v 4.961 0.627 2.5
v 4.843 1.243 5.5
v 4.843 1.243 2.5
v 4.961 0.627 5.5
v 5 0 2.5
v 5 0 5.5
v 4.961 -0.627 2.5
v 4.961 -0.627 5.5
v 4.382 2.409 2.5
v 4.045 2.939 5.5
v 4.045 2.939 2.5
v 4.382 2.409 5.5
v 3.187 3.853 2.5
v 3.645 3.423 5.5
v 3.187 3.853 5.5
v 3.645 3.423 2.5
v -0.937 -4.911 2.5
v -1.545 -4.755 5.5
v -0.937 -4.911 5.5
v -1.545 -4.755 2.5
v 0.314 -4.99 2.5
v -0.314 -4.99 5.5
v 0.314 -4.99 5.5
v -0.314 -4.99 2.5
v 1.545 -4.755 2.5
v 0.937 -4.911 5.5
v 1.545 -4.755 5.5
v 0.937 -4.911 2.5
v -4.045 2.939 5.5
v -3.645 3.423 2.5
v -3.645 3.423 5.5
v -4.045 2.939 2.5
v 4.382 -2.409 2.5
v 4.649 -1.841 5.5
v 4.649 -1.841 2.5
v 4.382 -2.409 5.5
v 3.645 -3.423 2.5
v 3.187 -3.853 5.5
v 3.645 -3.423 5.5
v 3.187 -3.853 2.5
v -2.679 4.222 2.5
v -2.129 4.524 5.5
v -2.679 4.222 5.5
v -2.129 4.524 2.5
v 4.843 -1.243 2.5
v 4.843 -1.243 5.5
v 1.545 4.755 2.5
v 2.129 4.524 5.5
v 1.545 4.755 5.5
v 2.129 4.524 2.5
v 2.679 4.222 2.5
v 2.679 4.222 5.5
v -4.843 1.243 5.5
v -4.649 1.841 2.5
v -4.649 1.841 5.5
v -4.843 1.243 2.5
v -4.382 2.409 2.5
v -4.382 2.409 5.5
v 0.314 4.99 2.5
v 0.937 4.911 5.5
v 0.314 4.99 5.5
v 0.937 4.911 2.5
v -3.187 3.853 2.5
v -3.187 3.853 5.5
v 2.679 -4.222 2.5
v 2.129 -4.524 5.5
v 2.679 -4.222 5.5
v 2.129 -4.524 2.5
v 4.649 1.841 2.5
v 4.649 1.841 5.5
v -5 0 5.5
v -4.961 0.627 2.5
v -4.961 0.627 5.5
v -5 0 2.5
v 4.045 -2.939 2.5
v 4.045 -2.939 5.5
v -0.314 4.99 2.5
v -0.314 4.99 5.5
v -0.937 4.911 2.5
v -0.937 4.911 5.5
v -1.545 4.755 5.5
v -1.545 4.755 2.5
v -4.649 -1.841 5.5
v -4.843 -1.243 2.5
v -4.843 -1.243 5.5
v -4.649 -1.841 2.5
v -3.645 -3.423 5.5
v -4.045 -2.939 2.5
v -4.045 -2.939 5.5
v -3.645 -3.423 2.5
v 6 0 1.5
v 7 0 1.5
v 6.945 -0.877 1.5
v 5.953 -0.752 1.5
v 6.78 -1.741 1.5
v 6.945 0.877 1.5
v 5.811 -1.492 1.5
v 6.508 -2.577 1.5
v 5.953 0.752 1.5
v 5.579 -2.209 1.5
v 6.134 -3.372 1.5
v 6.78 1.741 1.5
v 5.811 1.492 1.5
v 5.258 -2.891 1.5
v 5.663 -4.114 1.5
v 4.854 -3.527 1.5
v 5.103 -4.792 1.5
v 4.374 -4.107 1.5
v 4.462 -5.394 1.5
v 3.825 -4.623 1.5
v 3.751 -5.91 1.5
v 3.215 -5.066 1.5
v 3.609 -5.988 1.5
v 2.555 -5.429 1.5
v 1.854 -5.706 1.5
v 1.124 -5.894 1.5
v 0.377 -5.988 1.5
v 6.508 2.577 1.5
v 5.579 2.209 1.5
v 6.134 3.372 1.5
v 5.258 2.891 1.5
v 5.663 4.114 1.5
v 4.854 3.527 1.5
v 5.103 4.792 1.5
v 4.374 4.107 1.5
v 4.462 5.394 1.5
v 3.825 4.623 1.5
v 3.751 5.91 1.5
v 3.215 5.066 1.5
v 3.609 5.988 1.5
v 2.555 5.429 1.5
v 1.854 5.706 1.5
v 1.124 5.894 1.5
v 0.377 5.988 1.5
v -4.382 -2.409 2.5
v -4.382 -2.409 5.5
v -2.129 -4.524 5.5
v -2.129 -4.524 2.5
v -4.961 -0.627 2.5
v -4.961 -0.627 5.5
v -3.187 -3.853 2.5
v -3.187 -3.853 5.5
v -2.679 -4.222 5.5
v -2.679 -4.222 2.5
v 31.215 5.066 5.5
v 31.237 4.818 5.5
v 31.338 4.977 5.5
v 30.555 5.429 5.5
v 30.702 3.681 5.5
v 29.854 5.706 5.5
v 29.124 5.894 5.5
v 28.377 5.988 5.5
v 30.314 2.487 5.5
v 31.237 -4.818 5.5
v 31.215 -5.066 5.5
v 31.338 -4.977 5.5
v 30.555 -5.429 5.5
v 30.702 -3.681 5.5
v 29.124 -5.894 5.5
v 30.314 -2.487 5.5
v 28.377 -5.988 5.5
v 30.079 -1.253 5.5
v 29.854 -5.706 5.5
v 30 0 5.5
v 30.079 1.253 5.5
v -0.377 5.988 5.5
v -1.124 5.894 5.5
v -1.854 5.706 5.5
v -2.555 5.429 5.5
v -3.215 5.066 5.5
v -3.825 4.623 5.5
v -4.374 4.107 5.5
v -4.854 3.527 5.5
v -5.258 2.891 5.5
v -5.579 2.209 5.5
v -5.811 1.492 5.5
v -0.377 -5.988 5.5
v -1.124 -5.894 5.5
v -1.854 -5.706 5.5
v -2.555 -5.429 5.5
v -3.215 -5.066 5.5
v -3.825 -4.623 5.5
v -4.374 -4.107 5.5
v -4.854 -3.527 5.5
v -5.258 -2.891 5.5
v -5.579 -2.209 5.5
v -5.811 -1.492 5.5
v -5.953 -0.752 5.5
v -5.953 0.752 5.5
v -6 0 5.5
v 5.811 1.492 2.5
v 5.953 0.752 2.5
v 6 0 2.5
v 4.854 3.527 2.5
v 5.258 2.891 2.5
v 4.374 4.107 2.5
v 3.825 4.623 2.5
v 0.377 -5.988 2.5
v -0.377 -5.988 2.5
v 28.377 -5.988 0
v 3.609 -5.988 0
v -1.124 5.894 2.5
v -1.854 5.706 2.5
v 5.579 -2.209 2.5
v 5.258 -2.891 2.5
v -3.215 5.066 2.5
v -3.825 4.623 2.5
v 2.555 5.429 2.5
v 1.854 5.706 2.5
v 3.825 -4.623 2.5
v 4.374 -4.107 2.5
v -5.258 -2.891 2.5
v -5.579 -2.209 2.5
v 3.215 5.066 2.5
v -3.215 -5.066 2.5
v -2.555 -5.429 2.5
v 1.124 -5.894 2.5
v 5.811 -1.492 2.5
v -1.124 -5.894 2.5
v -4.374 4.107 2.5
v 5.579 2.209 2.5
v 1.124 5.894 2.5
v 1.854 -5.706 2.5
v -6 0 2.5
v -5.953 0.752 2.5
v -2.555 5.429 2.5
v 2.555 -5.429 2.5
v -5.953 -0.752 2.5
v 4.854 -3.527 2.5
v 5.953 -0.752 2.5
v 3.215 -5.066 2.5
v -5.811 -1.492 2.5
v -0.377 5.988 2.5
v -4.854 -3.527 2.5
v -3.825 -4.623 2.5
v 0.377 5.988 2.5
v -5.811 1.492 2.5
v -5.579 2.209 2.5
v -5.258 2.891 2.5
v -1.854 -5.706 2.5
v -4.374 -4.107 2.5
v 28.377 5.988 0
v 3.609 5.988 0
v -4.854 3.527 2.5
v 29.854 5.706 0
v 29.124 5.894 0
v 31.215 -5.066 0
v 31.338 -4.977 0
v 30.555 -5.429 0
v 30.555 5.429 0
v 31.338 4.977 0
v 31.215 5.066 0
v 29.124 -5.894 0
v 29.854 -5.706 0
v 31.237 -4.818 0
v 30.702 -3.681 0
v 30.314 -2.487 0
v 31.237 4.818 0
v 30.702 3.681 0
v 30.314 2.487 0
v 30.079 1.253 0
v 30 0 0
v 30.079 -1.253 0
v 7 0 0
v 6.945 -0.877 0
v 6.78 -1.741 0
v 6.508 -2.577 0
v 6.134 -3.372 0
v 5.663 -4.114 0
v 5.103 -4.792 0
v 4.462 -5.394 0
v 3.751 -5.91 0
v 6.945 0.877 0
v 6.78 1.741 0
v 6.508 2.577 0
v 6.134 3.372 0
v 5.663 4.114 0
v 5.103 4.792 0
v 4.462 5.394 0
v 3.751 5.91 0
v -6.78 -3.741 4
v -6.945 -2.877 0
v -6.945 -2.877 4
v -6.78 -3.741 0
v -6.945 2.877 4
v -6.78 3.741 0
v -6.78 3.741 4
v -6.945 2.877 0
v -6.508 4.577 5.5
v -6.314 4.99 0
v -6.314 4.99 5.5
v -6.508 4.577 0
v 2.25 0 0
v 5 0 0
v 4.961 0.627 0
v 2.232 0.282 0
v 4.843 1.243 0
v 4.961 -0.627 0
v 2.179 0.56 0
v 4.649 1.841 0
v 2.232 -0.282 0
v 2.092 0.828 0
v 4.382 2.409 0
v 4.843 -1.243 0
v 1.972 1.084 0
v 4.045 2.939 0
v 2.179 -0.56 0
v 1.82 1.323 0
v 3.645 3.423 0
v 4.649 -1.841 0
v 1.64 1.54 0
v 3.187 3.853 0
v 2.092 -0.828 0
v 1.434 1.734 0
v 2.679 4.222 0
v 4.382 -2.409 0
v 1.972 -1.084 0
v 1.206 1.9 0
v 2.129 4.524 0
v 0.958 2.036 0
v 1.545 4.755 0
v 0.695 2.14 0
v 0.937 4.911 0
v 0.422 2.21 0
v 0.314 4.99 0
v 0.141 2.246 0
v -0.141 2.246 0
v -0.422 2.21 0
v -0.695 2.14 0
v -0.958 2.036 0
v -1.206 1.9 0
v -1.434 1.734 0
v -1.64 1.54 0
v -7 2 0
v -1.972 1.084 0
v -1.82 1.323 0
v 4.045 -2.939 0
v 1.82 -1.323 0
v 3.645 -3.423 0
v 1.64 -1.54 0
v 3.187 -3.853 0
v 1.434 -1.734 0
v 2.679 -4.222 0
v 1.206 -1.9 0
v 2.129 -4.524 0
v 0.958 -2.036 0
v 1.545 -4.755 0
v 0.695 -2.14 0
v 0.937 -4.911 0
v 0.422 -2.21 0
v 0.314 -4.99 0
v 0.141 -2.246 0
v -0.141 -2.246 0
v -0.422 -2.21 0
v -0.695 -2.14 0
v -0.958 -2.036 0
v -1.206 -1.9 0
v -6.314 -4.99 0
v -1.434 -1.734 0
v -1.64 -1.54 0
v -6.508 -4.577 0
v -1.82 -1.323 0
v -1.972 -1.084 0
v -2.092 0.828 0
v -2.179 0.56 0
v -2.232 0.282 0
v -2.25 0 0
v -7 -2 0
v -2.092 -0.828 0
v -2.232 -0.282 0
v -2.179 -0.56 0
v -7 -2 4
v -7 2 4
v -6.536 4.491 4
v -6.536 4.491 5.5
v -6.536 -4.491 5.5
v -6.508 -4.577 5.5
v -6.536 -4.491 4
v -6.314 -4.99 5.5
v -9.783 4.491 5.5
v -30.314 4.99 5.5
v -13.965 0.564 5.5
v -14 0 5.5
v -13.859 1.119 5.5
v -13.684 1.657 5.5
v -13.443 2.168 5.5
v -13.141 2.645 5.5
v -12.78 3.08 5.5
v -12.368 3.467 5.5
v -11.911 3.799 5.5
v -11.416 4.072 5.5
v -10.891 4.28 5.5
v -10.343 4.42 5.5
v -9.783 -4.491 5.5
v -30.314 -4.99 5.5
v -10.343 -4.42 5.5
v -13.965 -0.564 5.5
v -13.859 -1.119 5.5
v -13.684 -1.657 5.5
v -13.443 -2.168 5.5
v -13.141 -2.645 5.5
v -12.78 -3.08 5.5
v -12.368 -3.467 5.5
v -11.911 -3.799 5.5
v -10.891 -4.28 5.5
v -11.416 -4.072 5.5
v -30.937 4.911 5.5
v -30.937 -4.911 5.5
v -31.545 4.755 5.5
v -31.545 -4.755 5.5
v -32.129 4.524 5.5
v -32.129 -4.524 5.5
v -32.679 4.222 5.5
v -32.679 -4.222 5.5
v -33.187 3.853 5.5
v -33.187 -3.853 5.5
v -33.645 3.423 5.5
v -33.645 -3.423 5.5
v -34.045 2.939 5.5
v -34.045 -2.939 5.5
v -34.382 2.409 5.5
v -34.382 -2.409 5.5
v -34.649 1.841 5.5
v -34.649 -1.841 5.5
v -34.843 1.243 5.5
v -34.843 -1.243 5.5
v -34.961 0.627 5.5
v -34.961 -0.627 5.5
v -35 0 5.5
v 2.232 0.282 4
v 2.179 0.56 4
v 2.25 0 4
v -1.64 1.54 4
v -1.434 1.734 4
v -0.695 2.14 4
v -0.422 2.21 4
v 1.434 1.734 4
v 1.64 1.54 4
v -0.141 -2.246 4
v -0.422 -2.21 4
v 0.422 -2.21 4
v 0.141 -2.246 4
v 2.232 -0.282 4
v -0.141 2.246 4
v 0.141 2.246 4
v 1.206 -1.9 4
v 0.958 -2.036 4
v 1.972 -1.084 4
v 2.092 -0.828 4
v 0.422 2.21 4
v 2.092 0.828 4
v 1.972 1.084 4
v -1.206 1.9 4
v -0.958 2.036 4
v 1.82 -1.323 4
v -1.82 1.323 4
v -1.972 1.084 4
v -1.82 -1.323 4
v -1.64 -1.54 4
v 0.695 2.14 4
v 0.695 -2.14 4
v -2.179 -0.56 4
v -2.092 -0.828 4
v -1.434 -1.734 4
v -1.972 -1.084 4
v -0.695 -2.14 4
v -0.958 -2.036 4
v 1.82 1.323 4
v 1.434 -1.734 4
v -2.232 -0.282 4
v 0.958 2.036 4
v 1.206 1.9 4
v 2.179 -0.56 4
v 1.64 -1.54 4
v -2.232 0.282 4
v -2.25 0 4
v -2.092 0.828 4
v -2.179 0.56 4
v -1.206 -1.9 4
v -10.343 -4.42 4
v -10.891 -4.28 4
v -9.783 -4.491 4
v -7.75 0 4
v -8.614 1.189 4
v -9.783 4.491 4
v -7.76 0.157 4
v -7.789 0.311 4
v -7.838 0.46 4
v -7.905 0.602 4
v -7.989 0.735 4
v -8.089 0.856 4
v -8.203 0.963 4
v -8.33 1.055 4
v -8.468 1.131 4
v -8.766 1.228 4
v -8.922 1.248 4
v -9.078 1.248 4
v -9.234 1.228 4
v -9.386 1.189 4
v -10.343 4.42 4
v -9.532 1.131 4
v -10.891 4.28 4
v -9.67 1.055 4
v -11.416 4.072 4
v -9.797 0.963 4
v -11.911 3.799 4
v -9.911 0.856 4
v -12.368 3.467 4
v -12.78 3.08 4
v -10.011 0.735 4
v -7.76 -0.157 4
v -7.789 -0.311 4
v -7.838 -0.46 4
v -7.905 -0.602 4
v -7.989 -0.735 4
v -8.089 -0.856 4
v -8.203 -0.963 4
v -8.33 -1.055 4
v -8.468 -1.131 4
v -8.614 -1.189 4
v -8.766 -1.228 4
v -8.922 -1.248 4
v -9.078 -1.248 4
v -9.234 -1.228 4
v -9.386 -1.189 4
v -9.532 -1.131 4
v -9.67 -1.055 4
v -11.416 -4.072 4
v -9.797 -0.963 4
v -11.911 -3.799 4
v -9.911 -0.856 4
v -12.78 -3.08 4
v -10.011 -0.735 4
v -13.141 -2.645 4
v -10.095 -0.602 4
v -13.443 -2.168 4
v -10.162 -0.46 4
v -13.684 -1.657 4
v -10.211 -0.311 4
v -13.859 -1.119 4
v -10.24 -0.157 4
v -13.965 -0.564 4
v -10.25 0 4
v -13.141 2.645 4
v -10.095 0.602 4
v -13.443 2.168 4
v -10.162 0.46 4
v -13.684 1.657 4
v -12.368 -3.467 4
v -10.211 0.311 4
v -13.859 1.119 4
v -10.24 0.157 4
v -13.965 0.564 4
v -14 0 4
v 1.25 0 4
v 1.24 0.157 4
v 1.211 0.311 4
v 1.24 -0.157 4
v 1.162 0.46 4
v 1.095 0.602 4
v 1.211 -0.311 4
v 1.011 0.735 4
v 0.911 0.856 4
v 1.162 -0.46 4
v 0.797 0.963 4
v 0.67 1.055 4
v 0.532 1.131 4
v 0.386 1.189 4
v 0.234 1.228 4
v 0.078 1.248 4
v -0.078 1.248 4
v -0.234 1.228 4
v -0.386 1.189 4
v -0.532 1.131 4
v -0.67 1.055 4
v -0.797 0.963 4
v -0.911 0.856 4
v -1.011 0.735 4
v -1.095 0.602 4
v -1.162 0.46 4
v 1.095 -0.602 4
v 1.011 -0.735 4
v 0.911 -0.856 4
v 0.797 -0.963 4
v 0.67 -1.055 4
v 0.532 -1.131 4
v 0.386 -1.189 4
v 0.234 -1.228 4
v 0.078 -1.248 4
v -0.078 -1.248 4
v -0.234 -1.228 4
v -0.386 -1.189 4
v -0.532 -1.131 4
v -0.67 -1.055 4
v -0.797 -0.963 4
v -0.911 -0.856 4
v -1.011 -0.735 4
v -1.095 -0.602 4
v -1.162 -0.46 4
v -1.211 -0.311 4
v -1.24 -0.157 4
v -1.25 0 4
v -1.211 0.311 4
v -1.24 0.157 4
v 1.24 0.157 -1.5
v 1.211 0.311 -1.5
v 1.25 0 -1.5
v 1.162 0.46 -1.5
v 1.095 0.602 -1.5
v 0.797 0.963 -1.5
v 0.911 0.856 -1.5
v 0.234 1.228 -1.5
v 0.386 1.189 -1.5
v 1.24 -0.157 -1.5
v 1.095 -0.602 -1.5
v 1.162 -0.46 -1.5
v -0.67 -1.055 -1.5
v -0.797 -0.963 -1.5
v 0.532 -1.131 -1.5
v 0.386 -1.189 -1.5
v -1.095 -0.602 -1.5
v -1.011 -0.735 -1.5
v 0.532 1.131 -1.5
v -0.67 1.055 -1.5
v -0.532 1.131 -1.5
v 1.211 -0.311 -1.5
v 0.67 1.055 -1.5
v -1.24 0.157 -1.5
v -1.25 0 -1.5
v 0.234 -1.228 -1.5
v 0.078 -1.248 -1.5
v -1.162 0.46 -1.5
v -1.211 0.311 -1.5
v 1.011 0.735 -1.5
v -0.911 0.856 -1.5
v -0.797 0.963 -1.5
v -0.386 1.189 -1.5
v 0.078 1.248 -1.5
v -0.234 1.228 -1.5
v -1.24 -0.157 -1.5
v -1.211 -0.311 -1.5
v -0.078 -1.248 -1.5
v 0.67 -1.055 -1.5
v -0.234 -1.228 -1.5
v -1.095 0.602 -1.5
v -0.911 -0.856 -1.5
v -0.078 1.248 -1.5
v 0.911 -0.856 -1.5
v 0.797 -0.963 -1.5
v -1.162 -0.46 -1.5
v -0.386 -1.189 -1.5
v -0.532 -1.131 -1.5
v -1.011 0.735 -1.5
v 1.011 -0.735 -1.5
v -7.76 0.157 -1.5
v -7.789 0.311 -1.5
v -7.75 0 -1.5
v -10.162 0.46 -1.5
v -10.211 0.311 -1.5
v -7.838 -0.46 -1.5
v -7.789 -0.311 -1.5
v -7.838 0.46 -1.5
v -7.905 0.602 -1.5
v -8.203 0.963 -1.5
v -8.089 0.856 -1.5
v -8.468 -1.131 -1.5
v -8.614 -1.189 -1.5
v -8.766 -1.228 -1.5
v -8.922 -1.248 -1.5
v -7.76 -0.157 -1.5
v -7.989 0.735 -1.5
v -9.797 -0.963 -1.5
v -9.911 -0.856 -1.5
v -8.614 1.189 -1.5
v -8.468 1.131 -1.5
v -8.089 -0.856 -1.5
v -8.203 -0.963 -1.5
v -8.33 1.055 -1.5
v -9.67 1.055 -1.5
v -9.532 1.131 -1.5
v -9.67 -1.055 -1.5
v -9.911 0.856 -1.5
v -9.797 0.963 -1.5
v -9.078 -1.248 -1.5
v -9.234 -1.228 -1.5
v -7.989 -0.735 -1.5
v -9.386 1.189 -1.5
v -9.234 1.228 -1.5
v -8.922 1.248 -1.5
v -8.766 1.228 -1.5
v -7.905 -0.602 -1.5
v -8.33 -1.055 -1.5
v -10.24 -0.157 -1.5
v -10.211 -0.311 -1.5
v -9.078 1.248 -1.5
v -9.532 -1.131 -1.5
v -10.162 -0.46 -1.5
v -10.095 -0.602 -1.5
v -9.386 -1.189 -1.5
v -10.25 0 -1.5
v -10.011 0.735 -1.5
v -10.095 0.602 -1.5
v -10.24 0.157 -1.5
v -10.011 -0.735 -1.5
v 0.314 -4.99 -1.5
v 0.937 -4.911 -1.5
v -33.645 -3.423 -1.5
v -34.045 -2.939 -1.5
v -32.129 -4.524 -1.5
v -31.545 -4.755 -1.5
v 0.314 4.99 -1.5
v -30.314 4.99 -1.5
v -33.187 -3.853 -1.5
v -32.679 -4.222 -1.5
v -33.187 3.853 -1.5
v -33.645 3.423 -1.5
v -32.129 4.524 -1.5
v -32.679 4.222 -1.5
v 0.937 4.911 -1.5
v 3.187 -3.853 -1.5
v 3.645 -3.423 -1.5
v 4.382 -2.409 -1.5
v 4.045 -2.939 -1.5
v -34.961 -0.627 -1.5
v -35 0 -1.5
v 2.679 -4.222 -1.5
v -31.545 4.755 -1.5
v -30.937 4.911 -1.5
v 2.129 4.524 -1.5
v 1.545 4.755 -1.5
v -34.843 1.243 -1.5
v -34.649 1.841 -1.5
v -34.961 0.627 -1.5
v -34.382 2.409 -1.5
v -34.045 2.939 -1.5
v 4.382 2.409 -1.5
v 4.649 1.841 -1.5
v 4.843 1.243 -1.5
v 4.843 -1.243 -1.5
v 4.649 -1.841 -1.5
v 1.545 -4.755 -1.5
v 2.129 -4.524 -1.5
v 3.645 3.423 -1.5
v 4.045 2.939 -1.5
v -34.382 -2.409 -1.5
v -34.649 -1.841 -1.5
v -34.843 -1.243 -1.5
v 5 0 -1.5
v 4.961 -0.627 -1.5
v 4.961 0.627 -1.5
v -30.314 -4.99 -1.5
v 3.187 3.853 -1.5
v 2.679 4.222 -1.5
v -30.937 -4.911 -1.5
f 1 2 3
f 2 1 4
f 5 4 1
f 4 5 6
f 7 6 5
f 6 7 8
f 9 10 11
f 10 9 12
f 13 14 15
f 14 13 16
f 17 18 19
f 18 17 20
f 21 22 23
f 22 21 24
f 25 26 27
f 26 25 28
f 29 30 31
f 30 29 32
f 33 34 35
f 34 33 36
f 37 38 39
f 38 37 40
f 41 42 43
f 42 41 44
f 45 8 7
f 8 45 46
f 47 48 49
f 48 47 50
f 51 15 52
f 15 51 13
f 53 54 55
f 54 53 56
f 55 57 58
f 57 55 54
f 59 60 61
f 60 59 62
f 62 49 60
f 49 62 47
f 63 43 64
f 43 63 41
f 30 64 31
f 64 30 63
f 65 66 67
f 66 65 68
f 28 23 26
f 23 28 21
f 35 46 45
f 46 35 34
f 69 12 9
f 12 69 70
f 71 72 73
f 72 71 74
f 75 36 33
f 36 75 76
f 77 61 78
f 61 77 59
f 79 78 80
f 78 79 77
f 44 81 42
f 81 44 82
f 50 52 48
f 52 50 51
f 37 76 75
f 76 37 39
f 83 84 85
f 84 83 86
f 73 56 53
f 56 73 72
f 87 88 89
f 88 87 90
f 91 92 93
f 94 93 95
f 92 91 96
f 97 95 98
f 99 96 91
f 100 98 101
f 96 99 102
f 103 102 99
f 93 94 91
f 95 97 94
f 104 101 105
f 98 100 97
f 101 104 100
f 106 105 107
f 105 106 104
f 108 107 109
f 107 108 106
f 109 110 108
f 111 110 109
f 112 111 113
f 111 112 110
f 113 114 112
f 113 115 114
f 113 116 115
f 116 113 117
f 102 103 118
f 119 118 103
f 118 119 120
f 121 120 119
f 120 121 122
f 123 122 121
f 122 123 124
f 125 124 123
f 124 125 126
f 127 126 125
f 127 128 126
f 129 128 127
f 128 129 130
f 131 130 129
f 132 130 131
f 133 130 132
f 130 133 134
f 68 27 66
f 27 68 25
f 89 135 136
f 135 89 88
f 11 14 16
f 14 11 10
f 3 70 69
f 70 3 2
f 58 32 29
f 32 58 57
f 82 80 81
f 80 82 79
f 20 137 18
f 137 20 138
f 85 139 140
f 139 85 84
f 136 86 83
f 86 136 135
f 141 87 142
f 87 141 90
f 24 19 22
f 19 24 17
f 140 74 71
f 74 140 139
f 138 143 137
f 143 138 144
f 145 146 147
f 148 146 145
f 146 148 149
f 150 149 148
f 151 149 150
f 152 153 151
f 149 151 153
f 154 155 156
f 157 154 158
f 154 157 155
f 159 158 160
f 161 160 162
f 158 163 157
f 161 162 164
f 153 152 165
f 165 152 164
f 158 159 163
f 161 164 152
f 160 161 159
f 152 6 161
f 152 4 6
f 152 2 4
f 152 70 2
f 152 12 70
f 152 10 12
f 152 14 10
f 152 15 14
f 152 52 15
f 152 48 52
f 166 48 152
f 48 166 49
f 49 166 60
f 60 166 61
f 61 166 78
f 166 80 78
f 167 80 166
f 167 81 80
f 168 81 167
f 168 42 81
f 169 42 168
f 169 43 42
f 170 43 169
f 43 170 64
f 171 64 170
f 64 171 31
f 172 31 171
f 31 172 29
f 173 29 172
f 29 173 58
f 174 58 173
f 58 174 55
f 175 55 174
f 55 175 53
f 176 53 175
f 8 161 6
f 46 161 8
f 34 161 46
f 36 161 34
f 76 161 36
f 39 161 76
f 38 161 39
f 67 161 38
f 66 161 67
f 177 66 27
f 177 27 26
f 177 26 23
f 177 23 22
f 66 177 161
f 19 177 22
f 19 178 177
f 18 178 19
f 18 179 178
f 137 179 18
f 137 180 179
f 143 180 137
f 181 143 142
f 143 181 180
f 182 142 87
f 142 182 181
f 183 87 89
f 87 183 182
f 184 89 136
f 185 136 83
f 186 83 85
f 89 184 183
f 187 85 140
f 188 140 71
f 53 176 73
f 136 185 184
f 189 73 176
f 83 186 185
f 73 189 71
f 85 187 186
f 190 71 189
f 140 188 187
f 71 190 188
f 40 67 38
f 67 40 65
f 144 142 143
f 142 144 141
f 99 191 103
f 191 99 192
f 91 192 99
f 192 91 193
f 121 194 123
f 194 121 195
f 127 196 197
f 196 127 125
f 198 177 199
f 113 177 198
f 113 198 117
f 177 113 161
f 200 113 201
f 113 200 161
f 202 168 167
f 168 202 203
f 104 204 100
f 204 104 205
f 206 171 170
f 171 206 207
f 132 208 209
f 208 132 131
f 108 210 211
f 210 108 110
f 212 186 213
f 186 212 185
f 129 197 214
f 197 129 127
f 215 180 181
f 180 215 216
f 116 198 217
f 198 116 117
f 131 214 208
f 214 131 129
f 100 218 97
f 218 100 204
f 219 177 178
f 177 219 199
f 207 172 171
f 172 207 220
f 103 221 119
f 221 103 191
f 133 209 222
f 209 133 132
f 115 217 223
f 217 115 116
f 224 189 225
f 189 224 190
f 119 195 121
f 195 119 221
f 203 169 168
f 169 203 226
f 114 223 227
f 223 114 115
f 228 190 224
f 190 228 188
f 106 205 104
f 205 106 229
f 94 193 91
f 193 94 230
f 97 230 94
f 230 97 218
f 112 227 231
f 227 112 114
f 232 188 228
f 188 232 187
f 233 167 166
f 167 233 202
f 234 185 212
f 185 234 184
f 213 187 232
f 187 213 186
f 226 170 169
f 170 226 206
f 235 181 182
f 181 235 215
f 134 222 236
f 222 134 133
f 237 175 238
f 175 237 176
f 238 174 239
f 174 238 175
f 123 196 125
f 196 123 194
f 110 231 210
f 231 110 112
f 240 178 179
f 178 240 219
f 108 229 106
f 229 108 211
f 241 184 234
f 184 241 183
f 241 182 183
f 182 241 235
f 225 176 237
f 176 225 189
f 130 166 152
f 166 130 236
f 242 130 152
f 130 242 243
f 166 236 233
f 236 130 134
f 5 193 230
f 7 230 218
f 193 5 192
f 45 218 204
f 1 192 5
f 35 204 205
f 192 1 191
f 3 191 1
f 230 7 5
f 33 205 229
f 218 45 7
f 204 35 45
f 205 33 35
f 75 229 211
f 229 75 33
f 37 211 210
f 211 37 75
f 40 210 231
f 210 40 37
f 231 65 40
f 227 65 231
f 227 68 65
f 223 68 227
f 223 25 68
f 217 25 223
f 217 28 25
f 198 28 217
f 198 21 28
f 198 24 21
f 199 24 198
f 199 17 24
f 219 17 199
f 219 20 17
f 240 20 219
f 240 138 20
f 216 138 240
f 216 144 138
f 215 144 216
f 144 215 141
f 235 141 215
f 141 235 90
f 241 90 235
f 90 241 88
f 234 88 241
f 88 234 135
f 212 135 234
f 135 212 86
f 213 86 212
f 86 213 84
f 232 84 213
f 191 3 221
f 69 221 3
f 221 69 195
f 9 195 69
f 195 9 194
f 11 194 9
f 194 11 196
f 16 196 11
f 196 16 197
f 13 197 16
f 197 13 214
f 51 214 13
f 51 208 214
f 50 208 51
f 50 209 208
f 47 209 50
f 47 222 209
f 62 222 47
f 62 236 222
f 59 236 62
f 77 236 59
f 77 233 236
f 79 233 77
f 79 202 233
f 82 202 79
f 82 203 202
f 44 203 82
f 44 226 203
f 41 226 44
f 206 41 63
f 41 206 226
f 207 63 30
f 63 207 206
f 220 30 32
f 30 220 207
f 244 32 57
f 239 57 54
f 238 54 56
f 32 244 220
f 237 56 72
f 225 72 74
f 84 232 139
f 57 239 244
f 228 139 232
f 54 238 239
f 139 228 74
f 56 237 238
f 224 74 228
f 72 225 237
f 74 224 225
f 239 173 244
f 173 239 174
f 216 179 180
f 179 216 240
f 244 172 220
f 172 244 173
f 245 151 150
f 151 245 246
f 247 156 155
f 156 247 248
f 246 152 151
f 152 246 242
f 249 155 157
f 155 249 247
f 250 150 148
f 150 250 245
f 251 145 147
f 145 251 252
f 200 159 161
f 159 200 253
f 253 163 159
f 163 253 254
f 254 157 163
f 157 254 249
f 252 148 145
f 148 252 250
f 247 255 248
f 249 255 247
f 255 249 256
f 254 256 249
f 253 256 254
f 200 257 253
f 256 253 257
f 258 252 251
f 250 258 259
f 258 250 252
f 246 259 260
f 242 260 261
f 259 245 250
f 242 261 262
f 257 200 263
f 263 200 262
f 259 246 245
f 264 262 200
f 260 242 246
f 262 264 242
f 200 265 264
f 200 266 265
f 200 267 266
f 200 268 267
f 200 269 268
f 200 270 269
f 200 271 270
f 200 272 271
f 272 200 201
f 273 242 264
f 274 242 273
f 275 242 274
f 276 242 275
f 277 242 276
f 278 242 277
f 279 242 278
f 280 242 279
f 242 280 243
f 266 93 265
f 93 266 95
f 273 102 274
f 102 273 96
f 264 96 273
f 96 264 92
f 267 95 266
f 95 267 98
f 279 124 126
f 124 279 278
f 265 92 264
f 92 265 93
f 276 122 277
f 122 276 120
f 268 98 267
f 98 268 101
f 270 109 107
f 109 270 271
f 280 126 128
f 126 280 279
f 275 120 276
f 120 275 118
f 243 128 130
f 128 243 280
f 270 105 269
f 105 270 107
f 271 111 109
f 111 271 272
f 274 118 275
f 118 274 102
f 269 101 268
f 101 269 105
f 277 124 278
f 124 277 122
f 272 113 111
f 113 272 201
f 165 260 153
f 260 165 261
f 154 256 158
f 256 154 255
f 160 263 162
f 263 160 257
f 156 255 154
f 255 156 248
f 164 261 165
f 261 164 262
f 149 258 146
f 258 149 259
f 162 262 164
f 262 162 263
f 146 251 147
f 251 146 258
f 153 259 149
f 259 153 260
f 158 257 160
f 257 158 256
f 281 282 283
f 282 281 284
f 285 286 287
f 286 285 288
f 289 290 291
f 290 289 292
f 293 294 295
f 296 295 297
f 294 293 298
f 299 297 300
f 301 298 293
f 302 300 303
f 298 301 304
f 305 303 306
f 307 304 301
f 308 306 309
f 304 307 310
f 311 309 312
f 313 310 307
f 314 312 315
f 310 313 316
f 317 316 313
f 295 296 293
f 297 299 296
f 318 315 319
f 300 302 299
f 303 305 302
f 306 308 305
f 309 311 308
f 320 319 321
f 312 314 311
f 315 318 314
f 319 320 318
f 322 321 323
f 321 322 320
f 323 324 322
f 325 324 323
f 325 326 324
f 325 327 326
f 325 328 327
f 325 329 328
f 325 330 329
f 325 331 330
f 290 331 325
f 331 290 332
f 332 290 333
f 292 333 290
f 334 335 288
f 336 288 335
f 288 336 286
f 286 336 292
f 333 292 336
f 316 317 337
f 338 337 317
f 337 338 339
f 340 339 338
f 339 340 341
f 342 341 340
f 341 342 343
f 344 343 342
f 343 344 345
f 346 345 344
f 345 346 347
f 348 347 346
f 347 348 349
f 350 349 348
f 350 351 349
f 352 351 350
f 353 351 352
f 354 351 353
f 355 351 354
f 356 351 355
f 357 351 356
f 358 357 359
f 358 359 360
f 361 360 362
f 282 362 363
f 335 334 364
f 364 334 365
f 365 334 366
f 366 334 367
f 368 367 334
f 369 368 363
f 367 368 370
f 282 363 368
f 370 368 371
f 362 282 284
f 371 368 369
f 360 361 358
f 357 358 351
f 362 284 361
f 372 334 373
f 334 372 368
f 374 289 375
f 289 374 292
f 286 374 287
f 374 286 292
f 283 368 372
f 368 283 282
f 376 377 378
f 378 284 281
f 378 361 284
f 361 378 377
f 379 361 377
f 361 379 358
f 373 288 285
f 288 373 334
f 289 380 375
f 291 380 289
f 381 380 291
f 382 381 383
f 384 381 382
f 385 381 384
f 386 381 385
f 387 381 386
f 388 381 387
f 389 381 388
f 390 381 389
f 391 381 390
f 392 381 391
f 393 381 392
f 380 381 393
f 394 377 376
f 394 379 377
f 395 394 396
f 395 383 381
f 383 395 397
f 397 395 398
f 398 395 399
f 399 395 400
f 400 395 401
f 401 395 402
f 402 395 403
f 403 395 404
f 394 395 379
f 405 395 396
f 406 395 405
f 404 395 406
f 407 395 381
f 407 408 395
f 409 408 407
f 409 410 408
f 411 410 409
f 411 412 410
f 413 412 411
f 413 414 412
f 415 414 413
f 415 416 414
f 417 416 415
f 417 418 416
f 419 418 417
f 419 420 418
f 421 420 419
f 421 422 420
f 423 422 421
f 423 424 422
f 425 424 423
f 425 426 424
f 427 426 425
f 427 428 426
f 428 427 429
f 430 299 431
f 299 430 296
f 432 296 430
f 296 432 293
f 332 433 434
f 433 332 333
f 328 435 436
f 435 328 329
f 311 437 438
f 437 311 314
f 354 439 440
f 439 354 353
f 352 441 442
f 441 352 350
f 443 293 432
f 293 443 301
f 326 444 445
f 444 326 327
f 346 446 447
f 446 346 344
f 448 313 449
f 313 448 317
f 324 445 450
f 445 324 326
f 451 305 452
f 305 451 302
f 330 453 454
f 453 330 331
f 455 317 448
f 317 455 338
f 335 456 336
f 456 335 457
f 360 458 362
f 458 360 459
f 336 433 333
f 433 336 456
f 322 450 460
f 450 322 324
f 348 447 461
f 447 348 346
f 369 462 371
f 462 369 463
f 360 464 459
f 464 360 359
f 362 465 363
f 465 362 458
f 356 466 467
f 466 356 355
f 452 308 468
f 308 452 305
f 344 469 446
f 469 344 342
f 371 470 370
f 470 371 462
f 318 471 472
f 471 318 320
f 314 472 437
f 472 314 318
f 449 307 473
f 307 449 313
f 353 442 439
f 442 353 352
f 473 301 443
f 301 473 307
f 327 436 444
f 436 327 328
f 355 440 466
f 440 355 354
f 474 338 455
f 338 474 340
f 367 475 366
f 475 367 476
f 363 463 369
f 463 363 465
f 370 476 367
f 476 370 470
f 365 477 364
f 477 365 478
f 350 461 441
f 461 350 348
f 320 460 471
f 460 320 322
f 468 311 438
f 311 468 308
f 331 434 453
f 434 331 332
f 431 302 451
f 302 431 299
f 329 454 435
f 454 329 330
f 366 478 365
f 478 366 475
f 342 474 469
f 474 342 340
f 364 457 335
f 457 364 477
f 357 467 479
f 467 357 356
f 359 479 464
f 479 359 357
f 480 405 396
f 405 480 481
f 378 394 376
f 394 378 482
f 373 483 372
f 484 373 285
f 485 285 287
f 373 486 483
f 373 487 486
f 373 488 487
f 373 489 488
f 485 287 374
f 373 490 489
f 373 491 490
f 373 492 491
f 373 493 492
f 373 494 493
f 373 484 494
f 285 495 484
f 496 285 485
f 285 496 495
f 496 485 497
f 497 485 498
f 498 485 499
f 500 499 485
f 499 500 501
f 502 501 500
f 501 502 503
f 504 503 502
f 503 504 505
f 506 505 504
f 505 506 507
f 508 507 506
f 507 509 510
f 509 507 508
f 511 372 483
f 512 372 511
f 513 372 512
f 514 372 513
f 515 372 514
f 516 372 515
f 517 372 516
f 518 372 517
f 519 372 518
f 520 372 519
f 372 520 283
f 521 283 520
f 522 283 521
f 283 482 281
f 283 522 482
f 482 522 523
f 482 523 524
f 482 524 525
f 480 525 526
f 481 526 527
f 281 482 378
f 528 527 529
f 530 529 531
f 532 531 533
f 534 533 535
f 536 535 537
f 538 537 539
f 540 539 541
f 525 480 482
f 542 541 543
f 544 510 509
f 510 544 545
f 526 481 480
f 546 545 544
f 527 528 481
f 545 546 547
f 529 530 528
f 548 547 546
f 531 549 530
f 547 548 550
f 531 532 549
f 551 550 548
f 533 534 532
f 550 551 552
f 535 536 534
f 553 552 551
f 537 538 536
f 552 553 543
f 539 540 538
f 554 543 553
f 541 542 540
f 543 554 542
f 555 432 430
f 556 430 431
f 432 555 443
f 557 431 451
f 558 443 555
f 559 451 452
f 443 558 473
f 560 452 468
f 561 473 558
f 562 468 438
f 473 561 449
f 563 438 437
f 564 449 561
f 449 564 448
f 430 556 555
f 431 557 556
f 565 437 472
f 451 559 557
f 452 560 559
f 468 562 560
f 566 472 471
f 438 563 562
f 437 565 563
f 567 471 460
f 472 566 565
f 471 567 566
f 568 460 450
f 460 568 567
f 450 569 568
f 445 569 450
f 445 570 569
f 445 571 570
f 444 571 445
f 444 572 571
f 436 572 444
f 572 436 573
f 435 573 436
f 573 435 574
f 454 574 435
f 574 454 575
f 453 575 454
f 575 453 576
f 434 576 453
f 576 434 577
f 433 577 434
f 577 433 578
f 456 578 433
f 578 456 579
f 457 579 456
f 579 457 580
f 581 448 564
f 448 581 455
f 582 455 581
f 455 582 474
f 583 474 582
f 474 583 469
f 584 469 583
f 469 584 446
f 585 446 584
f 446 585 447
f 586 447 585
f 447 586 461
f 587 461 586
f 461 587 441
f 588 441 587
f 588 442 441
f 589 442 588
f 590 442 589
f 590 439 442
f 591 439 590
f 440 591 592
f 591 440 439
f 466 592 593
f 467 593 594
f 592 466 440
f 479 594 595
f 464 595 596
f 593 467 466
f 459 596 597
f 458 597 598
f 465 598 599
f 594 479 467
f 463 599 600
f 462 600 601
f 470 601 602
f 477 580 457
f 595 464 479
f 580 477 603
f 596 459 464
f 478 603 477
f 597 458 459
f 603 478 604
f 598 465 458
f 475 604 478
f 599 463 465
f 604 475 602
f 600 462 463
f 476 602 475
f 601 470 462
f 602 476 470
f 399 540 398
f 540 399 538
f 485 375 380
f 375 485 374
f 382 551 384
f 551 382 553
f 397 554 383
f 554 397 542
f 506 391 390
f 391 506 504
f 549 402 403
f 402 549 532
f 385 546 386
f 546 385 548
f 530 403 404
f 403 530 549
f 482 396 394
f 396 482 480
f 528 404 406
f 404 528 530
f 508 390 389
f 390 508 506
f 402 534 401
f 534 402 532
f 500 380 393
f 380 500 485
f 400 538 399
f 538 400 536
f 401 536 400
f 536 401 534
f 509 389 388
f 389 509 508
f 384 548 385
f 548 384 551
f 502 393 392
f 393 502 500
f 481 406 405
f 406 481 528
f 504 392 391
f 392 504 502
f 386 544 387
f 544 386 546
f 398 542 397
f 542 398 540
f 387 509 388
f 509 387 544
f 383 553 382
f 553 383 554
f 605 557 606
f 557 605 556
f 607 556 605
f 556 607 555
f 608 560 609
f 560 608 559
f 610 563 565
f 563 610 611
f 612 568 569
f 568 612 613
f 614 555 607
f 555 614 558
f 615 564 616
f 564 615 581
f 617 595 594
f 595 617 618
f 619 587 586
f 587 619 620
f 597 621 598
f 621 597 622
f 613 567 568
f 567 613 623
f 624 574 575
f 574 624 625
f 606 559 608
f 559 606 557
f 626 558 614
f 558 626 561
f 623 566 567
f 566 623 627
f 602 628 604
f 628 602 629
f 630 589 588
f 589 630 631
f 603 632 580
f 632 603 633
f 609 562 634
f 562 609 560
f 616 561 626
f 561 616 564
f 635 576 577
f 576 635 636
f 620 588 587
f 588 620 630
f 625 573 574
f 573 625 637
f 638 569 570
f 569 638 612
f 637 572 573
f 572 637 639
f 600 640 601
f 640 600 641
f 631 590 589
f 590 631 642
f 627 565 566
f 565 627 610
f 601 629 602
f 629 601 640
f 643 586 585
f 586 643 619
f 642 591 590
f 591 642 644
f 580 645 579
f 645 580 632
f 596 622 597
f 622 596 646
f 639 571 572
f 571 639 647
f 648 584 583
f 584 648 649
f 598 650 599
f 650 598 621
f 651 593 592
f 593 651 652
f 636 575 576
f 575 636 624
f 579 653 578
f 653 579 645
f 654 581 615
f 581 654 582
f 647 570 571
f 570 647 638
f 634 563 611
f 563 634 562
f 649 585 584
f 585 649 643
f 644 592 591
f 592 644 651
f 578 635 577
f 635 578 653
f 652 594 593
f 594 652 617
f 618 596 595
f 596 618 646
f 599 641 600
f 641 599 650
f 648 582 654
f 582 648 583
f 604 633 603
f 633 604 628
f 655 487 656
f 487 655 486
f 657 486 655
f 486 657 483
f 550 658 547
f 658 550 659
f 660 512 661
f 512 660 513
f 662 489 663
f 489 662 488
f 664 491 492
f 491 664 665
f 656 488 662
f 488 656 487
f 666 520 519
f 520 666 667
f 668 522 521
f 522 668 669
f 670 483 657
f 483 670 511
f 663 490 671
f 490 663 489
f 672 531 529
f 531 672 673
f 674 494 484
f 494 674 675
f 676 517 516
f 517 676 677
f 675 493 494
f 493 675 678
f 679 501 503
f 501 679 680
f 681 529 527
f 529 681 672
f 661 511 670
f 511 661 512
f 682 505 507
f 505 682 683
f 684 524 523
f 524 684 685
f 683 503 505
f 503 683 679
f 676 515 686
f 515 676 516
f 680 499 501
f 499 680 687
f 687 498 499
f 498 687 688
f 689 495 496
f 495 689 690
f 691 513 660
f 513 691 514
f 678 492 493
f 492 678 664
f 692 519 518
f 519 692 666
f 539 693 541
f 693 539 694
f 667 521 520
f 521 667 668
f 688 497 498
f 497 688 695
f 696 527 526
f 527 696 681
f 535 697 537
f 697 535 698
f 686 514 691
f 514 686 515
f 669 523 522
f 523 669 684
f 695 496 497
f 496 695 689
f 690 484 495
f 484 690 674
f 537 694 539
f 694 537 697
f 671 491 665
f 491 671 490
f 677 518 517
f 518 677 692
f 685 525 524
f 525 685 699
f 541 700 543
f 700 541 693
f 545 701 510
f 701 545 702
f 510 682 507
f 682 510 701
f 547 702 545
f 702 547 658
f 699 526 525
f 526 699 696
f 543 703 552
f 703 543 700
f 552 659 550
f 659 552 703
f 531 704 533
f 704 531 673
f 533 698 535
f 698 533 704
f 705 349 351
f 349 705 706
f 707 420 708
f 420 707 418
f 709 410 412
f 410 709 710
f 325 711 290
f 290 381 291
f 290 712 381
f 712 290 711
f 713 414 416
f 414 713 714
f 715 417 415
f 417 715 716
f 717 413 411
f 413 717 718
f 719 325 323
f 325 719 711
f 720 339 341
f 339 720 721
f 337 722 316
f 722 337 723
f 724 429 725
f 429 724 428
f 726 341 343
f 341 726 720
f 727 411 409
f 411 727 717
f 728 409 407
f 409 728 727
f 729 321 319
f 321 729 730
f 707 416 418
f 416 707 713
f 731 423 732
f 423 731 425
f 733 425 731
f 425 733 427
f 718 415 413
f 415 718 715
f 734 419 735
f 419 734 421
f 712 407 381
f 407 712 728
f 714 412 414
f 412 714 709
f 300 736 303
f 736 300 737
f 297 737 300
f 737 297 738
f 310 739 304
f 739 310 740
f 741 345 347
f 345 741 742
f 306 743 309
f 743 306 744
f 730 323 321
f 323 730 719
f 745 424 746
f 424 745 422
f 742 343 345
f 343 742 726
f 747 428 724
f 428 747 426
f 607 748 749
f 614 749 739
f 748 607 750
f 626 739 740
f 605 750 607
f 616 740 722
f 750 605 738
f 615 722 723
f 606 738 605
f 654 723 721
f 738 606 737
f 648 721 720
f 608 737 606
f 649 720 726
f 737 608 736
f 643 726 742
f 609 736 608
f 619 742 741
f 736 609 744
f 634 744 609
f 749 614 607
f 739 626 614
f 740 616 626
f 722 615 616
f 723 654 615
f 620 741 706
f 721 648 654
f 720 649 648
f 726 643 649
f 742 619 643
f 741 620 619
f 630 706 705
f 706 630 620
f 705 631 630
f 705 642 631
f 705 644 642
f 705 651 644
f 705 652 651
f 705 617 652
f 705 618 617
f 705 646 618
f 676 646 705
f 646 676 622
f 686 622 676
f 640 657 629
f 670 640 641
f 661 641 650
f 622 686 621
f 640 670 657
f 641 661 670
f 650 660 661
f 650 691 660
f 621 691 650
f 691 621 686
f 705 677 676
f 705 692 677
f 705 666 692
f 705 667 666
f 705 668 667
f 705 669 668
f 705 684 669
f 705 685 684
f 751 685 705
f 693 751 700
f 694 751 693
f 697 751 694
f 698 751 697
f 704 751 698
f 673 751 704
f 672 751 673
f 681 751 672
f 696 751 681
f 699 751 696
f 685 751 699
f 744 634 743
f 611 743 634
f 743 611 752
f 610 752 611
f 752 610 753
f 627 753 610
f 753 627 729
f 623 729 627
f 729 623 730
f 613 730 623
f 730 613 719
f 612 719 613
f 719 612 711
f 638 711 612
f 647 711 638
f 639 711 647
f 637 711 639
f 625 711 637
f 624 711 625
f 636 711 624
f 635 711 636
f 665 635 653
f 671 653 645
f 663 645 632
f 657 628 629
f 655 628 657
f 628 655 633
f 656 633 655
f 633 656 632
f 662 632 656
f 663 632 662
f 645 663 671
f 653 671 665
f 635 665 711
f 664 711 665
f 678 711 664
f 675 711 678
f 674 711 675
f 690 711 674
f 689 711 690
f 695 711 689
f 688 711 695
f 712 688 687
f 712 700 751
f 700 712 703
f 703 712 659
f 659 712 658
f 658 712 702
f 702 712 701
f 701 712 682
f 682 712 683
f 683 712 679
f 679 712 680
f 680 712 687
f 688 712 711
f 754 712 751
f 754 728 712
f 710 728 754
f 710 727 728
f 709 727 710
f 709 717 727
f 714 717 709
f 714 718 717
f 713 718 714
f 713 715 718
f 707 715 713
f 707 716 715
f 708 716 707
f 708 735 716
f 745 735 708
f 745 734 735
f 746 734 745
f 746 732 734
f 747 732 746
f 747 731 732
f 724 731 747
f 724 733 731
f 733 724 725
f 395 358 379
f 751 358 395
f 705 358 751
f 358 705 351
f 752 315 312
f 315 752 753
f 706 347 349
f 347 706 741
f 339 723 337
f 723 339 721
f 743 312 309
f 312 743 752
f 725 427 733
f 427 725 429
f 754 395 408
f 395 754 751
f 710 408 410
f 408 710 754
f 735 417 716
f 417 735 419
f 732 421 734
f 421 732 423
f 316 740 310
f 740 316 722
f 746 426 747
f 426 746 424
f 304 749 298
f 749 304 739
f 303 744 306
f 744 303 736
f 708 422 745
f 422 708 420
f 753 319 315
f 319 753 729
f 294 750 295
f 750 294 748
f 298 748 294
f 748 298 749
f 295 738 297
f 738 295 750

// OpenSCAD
BEARING_DIA = 10;
BEARING_THICKNESS = 3;
BEARING_FLANGE_DIA = 12;
BEARING_FLANGE_THICKNESS = 1;
BEARING_HOLE_DIA = 4.5;

TOP_PLATE_THICKNESS = 1.5;
TOP_PLATE_WIDTH = 9;
TOP_PLATE_LENGTH = 18.5;
TOP_PLATE_HOLE_DIA = 2.5;
TOP_PLATE_HOLE_SPACING = 9;

TOP_SEGMENT_LENGTH = 40;
TOP_SEGMENT_WIDTH = BEARING_DIA;
TOP_SEGMENT_THICKNESS = BEARING_THICKNESS + BEARING_FLANGE_THICKNESS + 2 * TOP_PLATE_THICKNESS;
TOP_SOCKET_DIA = 14;

BOT_SEGMENT_LENGTH = 40;
BOT_SEGMENT_WIDTH = BEARING_FLANGE_DIA;
BOT_SEGMENT_THICKNESS = BEARING_THICKNESS + BEARING_FLANGE_THICKNESS + TOP_PLATE_THICKNESS;
BOT_SOCKET_DIA = 20;

$fn = 50;

module bearing() {
    cylinder(d = BEARING_DIA, h = BEARING_THICKNESS + BEARING_FLANGE_THICKNESS);
    cylinder(d = BEARING_FLANGE_DIA, h = BEARING_FLANGE_THICKNESS);
}

module bot_segment() {
    difference() {
        hull() {
            cylinder(d = BOT_SEGMENT_WIDTH, h = BOT_SEGMENT_THICKNESS);
            translate([BOT_SEGMENT_LENGTH - BOT_SEGMENT_WIDTH, 0, 0])
            cylinder(d = BOT_SEGMENT_WIDTH, h = BOT_SEGMENT_THICKNESS);
        }
        cylinder(d = TOP_SOCKET_DIA, h = TOP_PLATE_THICKNESS);
        translate([0, 0, TOP_PLATE_THICKNESS])
        bearing();
        translate([BOT_SEGMENT_LENGTH, 0, 0])
        cylinder(d = BOT_SOCKET_DIA, h = BOT_SEGMENT_THICKNESS);
    }
}

module top_plate() {
    hull() {
        cylinder(d = TOP_PLATE_WIDTH, h = TOP_PLATE_THICKNESS);
        translate([-TOP_PLATE_LENGTH + TOP_PLATE_WIDTH, 0, 0])
        cylinder(d = TOP_PLATE_WIDTH, h = TOP_PLATE_THICKNESS);
    }
    cylinder(d = TOP_PLATE_HOLE_DIA, h = 15, center = true);
    translate([-TOP_PLATE_HOLE_SPACING, 0, 0])
    cylinder(d = TOP_PLATE_HOLE_DIA, h = 15, center = true);
}

module top_segment() {
    difference() {
        hull() {
            cylinder(d = TOP_SEGMENT_WIDTH, h = TOP_SEGMENT_THICKNESS);
            translate([-TOP_SEGMENT_LENGTH + TOP_SEGMENT_WIDTH, 0, 0])
            cylinder(d = TOP_SEGMENT_WIDTH, h = TOP_SEGMENT_THICKNESS);
        }
        #difference(){
            hull() {
                translate([0, -2, TOP_PLATE_THICKNESS])
                cylinder(d = TOP_SOCKET_DIA, h = BOT_SEGMENT_THICKNESS + TOP_PLATE_THICKNESS);
                translate([0, 2, TOP_PLATE_THICKNESS])
                cylinder(d = TOP_SOCKET_DIA, h = BOT_SEGMENT_THICKNESS + TOP_PLATE_THICKNESS);
            }
            cylinder(d = BEARING_HOLE_DIA, h = TOP_SEGMENT_THICKNESS);
        }
        translate([0, 0, TOP_SEGMENT_THICKNESS-TOP_PLATE_THICKNESS])
        top_plate();
    }
}

bot_segment();
translate([0, 0, -TOP_PLATE_THICKNESS])
top_segment();
